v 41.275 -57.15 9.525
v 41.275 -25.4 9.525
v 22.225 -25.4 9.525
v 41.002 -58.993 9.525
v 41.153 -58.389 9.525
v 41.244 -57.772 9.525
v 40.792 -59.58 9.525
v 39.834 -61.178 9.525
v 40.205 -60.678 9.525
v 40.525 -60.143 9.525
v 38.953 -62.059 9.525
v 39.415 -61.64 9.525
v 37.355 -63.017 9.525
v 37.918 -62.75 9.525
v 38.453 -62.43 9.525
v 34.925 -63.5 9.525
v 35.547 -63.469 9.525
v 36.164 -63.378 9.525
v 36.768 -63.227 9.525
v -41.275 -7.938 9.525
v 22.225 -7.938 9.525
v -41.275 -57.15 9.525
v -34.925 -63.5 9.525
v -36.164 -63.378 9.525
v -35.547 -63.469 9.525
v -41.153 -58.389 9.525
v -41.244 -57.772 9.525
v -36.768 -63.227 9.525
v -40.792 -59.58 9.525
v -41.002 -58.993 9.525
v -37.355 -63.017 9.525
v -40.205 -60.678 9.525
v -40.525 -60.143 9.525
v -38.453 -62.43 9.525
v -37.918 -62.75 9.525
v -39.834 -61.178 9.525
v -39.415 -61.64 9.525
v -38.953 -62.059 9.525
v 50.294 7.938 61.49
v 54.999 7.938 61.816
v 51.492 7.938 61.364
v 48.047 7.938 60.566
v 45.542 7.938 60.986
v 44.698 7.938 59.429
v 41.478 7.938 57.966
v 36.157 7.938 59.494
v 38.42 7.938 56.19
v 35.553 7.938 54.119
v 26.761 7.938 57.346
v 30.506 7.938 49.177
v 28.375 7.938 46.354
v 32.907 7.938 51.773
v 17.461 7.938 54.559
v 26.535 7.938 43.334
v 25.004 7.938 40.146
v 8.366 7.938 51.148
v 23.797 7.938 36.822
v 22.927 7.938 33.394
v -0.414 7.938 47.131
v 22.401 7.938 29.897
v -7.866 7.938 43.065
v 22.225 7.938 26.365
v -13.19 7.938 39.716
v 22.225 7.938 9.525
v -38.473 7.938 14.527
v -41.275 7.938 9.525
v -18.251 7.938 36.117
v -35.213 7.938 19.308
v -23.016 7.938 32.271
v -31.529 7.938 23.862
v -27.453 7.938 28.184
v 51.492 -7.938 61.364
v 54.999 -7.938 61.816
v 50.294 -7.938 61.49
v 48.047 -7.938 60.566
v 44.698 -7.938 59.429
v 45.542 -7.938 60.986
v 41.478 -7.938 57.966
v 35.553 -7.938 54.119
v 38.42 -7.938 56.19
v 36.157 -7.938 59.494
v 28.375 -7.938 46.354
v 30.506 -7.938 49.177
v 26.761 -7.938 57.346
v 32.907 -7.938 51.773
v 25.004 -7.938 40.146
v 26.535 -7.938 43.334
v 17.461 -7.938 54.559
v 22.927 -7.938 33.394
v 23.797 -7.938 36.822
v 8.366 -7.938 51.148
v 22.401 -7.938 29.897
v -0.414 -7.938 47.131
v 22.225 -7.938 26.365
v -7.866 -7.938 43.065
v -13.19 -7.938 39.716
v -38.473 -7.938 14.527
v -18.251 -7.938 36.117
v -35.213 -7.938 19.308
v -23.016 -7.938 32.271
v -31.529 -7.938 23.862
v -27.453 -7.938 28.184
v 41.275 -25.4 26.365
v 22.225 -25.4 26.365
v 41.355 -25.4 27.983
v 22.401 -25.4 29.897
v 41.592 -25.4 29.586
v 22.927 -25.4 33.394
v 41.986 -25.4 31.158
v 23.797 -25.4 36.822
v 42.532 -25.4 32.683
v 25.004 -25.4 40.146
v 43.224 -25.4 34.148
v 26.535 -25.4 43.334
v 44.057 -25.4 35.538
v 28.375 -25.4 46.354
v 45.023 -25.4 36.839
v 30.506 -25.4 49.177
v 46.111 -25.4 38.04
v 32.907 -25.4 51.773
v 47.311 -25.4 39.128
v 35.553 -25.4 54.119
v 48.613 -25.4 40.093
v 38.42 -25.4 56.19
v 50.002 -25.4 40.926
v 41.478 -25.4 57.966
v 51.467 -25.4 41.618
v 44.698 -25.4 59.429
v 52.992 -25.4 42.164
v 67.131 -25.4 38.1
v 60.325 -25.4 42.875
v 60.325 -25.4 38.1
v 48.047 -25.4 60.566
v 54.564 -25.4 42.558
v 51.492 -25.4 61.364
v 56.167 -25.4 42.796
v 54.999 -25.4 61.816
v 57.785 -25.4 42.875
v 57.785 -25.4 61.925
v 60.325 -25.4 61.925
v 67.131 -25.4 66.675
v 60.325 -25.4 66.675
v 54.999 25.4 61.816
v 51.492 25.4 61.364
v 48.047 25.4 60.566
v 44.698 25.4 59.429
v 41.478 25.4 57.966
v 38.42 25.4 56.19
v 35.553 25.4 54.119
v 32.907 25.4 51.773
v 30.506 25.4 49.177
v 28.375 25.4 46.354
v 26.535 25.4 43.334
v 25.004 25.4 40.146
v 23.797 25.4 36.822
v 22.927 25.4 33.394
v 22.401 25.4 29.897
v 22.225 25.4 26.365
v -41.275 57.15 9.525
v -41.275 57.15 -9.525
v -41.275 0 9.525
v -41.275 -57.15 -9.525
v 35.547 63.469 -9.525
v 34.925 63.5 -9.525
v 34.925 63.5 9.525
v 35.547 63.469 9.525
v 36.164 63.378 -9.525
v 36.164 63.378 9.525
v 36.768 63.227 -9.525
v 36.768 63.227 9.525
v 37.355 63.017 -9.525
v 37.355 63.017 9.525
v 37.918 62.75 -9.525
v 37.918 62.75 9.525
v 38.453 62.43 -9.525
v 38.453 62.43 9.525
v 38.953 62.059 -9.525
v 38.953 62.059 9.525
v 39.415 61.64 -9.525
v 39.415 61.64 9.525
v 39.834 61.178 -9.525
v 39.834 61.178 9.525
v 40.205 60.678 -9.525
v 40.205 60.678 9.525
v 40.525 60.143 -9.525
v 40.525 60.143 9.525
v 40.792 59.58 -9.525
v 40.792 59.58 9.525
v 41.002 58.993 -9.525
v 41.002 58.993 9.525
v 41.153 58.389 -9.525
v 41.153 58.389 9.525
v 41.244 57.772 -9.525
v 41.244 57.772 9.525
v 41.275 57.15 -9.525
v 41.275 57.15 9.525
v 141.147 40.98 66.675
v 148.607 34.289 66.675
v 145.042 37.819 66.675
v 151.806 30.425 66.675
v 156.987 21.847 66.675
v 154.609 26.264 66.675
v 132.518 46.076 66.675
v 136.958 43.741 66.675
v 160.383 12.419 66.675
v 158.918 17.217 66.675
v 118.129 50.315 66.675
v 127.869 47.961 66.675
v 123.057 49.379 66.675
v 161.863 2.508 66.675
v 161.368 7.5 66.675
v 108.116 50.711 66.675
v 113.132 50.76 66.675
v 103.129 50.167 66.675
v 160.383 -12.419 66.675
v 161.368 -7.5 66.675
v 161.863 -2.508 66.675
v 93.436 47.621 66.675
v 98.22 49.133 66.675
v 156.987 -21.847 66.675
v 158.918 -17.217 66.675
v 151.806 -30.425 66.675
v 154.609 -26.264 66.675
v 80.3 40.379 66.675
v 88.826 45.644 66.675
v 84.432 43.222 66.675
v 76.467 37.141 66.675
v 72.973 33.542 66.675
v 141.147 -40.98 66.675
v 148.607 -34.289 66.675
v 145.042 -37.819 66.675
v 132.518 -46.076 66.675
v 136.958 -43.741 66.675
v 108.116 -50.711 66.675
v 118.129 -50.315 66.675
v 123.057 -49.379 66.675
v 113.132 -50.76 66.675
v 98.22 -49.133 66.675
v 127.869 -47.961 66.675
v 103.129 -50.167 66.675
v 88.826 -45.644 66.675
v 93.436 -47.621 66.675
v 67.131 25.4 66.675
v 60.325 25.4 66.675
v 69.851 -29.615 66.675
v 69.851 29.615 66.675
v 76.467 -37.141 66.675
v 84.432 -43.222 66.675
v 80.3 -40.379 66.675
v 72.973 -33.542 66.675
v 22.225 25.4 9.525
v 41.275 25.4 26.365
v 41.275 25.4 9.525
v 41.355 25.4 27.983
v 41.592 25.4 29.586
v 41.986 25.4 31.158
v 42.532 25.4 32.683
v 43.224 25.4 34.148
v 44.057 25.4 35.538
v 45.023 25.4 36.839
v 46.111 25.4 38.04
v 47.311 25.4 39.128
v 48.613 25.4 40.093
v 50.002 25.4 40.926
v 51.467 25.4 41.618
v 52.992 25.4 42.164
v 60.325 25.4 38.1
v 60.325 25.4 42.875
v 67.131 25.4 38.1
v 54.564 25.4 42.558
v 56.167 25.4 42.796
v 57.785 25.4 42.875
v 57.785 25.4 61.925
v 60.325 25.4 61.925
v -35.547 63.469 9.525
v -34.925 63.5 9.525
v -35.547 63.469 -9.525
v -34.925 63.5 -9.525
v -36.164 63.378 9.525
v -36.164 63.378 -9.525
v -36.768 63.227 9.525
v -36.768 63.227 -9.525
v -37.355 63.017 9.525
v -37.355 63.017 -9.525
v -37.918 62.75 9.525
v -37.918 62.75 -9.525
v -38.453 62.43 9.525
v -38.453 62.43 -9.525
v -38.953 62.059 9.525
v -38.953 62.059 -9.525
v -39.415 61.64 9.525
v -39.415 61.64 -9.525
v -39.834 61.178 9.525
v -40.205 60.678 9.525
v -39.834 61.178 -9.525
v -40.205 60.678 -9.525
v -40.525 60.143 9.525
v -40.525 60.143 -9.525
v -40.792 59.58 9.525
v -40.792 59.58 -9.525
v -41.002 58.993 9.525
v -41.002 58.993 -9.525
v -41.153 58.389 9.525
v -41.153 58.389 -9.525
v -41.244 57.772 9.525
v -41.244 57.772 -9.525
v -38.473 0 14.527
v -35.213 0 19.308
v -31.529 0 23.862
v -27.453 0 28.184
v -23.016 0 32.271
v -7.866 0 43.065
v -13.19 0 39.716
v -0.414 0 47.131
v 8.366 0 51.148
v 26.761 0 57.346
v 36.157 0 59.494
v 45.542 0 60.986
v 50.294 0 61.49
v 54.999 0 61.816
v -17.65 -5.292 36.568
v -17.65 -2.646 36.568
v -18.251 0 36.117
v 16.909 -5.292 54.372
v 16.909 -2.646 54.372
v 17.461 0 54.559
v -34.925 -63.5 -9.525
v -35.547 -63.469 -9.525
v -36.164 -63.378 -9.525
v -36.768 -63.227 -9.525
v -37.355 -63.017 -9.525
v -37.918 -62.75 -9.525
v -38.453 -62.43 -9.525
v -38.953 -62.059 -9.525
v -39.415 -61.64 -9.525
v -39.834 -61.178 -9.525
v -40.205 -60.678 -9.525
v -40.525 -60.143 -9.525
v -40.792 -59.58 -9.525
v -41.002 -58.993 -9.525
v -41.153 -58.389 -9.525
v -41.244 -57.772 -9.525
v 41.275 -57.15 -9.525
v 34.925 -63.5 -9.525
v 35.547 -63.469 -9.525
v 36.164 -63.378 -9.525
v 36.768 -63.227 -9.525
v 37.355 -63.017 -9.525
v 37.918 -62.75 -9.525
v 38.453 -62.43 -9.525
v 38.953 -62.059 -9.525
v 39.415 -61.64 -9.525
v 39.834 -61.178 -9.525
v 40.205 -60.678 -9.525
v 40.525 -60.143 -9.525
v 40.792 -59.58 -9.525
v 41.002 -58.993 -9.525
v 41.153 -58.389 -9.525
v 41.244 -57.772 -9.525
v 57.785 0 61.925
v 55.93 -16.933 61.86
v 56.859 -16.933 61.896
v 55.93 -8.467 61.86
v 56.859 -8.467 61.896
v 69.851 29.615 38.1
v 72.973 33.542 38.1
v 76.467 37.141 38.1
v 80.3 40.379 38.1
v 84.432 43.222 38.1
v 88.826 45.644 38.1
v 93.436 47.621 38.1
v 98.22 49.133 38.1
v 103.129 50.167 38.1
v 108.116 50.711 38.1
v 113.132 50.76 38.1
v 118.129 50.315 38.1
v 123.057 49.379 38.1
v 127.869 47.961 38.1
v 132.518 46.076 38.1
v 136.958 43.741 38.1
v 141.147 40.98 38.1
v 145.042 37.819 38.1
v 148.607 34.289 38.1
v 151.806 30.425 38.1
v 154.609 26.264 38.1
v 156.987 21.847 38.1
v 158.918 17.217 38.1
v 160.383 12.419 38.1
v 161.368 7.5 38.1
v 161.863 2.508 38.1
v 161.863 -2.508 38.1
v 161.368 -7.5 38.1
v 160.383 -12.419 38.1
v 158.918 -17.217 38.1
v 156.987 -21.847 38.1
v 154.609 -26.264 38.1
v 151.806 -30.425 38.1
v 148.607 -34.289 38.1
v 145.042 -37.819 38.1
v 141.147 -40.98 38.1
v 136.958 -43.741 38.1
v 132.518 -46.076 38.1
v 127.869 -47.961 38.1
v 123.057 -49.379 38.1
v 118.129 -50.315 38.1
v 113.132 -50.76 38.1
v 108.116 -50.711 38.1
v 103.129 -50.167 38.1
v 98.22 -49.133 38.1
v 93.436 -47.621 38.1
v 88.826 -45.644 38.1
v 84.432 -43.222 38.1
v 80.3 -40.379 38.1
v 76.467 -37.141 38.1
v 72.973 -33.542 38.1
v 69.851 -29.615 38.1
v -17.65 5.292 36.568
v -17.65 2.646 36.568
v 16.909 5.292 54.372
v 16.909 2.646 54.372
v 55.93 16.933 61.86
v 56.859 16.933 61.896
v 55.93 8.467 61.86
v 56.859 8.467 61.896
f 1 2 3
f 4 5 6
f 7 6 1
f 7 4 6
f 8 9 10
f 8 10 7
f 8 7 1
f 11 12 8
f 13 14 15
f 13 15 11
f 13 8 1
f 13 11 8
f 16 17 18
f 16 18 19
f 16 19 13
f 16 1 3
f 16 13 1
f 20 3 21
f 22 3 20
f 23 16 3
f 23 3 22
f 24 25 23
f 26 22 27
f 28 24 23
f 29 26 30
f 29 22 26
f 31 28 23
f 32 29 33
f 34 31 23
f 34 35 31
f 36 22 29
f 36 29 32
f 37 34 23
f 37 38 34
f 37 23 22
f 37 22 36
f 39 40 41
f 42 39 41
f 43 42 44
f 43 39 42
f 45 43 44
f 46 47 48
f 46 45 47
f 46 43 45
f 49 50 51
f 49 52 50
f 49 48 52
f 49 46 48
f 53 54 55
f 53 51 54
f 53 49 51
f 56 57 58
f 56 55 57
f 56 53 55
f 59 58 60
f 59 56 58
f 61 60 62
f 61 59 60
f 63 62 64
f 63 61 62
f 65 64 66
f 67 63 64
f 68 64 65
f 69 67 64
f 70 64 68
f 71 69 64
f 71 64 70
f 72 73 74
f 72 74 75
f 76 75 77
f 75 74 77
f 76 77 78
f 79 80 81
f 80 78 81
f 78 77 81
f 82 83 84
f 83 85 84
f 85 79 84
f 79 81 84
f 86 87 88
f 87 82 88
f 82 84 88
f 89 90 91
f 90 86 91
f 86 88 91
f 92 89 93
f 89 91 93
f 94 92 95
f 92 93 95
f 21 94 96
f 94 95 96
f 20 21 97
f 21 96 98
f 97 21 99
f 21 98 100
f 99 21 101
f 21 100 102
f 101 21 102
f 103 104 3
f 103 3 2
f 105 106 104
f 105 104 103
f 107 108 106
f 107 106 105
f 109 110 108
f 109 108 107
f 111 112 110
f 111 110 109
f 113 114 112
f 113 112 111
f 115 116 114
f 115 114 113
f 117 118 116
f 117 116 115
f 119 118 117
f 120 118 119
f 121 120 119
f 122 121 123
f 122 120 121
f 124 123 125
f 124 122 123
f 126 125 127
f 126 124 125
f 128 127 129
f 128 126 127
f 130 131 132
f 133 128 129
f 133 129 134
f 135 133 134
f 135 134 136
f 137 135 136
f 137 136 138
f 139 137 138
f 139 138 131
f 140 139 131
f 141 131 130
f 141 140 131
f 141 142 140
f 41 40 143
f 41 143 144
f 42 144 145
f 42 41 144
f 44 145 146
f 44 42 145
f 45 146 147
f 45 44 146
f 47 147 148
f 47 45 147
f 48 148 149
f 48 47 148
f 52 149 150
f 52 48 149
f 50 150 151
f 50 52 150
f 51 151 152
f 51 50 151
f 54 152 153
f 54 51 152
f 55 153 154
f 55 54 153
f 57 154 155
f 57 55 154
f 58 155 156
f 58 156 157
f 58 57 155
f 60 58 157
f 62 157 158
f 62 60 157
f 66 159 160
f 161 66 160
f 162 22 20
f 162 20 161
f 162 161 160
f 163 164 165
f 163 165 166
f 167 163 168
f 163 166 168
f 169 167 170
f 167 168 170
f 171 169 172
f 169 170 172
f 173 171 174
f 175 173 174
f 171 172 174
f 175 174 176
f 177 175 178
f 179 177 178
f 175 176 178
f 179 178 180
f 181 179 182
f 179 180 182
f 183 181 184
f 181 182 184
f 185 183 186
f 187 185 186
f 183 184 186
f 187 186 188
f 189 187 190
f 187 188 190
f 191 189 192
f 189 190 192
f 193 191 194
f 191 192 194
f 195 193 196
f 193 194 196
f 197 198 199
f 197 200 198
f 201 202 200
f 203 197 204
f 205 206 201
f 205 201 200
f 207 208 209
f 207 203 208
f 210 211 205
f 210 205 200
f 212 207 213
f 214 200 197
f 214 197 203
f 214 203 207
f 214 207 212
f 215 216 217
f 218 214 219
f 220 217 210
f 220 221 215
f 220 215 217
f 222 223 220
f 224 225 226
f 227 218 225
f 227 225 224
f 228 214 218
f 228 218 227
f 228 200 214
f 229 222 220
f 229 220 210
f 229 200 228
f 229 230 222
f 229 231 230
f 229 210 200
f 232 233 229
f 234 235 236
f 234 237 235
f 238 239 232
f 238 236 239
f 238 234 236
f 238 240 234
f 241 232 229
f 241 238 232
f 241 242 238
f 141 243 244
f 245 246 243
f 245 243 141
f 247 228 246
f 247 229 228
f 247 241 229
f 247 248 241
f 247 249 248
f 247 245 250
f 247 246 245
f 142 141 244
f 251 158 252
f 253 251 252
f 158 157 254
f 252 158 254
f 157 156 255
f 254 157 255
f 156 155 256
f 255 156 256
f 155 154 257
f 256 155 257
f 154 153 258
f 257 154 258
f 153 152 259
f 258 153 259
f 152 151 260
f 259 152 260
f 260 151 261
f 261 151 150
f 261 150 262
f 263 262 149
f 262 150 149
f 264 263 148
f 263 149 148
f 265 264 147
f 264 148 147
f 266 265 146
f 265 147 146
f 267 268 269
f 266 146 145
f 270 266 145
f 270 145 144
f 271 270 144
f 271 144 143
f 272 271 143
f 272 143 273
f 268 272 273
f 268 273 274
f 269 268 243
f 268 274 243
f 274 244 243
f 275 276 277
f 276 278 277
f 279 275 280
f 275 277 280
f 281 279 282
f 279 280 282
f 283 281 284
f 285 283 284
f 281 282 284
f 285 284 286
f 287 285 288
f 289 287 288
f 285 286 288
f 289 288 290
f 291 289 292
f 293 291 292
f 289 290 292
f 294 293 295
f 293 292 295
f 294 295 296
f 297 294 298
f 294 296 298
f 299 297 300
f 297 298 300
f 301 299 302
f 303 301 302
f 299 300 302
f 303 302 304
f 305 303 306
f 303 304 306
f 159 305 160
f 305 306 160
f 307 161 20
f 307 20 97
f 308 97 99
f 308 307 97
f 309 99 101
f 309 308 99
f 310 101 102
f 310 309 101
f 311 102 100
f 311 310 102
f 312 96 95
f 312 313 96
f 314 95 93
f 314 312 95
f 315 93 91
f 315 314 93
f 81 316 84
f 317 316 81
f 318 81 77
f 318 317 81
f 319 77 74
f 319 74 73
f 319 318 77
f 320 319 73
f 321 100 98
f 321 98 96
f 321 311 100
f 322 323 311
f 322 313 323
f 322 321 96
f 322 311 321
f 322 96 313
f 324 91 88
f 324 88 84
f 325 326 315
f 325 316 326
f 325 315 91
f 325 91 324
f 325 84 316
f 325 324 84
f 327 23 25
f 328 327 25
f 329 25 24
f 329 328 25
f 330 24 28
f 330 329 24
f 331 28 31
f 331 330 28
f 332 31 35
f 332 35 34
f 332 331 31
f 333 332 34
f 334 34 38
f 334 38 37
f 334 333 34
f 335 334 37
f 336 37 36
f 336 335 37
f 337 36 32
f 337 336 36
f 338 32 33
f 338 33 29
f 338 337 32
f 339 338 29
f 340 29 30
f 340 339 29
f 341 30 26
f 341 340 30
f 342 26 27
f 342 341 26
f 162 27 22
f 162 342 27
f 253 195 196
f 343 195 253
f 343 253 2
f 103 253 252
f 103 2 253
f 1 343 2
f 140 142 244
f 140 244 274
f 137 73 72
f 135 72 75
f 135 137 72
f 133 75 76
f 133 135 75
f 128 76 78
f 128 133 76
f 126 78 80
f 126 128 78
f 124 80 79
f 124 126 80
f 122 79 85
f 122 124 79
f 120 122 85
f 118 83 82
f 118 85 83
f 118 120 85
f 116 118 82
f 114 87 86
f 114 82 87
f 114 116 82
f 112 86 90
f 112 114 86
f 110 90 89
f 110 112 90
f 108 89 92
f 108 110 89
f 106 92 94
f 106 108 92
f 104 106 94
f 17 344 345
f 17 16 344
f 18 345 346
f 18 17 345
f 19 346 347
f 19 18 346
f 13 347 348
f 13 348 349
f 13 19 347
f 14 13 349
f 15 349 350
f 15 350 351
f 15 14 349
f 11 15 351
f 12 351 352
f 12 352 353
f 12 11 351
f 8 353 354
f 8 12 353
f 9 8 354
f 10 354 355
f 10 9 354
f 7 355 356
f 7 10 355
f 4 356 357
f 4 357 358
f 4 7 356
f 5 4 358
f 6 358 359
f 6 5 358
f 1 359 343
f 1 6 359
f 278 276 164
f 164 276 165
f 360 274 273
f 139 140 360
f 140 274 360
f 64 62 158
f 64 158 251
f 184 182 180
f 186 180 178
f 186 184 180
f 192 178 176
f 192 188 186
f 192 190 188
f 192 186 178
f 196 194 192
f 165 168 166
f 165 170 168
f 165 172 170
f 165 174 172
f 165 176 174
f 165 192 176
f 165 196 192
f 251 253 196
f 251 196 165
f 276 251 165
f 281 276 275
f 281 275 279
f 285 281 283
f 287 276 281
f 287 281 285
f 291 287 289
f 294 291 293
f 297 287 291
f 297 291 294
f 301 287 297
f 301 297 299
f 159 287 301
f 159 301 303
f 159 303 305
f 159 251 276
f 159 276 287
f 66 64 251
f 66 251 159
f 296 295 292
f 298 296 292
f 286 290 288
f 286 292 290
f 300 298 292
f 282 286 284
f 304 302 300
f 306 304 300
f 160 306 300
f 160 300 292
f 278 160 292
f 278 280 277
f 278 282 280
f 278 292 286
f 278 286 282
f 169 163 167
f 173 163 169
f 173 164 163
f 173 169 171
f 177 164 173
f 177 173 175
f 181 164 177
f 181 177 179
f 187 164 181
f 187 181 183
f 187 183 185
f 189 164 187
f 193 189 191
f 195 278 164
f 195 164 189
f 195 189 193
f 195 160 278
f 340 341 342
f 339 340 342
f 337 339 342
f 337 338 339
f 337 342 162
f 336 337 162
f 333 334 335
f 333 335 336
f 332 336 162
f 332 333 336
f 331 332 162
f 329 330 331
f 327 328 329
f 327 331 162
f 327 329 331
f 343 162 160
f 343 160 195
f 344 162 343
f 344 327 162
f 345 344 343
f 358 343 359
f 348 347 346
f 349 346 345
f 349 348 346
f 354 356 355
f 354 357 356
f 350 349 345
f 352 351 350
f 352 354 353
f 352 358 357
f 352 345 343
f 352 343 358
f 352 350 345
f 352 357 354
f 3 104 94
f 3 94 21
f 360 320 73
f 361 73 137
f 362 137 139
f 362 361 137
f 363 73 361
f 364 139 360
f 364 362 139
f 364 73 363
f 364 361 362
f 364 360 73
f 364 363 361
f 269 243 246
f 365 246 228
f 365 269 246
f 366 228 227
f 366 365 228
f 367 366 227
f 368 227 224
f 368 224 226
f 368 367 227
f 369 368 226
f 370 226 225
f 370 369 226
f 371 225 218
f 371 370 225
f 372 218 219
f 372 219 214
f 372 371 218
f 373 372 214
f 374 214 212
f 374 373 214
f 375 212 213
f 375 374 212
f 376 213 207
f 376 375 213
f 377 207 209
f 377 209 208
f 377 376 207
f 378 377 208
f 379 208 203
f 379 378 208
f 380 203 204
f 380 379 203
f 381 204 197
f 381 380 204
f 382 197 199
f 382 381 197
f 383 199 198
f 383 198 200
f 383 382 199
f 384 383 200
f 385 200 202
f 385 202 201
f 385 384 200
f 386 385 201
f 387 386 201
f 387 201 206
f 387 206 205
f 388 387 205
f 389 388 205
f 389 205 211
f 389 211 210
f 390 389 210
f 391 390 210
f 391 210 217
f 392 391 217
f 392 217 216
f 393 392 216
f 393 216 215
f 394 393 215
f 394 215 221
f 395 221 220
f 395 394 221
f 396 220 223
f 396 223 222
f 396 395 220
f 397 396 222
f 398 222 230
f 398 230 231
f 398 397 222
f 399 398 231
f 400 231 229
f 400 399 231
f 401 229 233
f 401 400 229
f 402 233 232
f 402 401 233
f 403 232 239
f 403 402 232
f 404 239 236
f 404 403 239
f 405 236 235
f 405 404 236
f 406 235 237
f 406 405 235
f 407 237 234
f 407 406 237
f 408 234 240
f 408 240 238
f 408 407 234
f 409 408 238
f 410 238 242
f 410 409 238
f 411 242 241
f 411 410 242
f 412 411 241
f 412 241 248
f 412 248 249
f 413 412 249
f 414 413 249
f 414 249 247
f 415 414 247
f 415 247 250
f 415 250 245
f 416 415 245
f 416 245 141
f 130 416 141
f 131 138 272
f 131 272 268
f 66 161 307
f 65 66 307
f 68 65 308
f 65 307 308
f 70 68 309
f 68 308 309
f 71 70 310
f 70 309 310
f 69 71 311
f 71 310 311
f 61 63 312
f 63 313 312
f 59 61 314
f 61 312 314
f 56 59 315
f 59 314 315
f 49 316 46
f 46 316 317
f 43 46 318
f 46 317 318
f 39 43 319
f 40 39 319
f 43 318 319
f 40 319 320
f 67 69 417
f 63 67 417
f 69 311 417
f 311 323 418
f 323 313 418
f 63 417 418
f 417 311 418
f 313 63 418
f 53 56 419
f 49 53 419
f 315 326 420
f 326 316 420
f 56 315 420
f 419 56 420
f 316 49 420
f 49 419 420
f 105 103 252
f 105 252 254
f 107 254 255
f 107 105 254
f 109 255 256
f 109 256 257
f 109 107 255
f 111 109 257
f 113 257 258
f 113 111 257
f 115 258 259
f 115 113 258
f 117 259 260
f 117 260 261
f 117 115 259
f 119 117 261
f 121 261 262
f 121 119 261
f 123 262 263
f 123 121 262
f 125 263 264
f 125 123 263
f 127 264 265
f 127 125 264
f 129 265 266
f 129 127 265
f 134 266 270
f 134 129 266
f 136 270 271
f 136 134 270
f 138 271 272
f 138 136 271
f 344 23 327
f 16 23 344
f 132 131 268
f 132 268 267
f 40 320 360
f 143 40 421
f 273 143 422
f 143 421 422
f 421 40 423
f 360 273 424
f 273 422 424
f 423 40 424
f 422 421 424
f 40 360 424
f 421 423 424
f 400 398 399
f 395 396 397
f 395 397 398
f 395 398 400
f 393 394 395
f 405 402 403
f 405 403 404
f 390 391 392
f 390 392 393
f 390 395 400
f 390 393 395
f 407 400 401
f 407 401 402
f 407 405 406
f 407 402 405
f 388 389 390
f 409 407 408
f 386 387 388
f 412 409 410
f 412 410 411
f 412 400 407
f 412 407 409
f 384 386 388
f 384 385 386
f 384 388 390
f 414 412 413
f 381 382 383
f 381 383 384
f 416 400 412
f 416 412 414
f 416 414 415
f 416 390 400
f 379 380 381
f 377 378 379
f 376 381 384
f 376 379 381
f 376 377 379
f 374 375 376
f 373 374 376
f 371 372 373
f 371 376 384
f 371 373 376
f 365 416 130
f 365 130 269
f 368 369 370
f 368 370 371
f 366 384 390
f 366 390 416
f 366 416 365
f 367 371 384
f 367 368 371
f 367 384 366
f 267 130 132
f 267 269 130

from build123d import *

# Parameters (mm, degrees)
F1_DEPTH = 63.5
F2_DEPTH = 25.4
F3_DEPTH = 7.9375
F5_R     = 6.35


with BuildPart() as f1:
    # F0 (on Front) → F1 (new body, symmetric)
    with BuildSketch(Plane.XZ):
        Polygon((22.225, 9.525), (-41.275, 9.525), (-41.275, -9.525), (41.275, -9.525), (41.275, 9.525), align=None)
    extrude(amount=F1_DEPTH, both=True)

    # F0 (on Front) → F2 (join, symmetric)
    with BuildSketch(Plane.XZ):
        with BuildLine():
            Line((22.225, 26.3652), (22.225, 9.525))
            Line((22.225, 9.525), (41.275, 9.525))
            Line((41.275, 9.525), (41.275, 26.3652))
            ThreePointArc((41.275, 26.3652), (46.110667, 38.039533), (57.785, 42.8752))
            Line((57.785, 42.8752), (60.325, 42.8752))
            Line((60.325, 42.8752), (60.325, 61.9252))
            Line((60.325, 61.9252), (57.785, 61.9252))
            add(Edge.make_bspline(
                [(54.999193, 61.815911), (55.93158, 61.863075), (56.860354, 61.899531), (57.785, 61.9252)],
                knots=[109.33874, 109.33874, 109.33874, 109.33874, 112.065448, 112.065448, 112.065448, 112.065448], degree=3))
            ThreePointArc((54.999193, 61.815911), (31.673921, 50.504901), (22.225, 26.3652))
        make_face()
        Polygon((60.325, 66.675), (60.325, 61.9252), (60.325, 42.8752), (60.325, 38.1), (111.125, 38.1), (111.125, 66.675), align=None)
    extrude(amount=F2_DEPTH, both=True)

    # F0 (on Front) → F3 (join, symmetric)
    with BuildSketch(Plane.XZ):
        with BuildLine():
            add(Edge.make_bspline(
                [(-41.275, 9.525), (-25.584794, 40.814355), (17.611256, 59.924649), (54.999193, 61.815911)],
                knots=[0, 0, 0, 0, 109.33874, 109.33874, 109.33874, 109.33874], degree=3))
            Line((-41.275, 9.525), (22.225, 9.525))
            Line((22.225, 9.525), (22.225, 26.3652))
            ThreePointArc((22.225, 26.3652), (31.673921, 50.504901), (54.999193, 61.815911))
        make_face()
    extrude(amount=F3_DEPTH, both=True)

    # F0 (on Front) → F4 (revolve)
    with BuildSketch(Plane.XZ):
        Polygon((60.325, 66.675), (60.325, 61.9252), (60.325, 42.8752), (60.325, 38.1), (111.125, 38.1), (111.125, 66.675), align=None)
    revolve(axis=Axis((111.125, 0, 52.3875), (0, 0, -1)))

    # F5
    f5_edges = [f1.edges().sort_by_distance(p)[0] for p in [
        (41.275, 63.5, 0),
        (-41.275, 63.5, 0),
        (41.275, -63.5, 0),
        (-41.275, -63.5, 0),
    ]]
    fillet(f5_edges, radius=F5_R)


solid = f1.part
